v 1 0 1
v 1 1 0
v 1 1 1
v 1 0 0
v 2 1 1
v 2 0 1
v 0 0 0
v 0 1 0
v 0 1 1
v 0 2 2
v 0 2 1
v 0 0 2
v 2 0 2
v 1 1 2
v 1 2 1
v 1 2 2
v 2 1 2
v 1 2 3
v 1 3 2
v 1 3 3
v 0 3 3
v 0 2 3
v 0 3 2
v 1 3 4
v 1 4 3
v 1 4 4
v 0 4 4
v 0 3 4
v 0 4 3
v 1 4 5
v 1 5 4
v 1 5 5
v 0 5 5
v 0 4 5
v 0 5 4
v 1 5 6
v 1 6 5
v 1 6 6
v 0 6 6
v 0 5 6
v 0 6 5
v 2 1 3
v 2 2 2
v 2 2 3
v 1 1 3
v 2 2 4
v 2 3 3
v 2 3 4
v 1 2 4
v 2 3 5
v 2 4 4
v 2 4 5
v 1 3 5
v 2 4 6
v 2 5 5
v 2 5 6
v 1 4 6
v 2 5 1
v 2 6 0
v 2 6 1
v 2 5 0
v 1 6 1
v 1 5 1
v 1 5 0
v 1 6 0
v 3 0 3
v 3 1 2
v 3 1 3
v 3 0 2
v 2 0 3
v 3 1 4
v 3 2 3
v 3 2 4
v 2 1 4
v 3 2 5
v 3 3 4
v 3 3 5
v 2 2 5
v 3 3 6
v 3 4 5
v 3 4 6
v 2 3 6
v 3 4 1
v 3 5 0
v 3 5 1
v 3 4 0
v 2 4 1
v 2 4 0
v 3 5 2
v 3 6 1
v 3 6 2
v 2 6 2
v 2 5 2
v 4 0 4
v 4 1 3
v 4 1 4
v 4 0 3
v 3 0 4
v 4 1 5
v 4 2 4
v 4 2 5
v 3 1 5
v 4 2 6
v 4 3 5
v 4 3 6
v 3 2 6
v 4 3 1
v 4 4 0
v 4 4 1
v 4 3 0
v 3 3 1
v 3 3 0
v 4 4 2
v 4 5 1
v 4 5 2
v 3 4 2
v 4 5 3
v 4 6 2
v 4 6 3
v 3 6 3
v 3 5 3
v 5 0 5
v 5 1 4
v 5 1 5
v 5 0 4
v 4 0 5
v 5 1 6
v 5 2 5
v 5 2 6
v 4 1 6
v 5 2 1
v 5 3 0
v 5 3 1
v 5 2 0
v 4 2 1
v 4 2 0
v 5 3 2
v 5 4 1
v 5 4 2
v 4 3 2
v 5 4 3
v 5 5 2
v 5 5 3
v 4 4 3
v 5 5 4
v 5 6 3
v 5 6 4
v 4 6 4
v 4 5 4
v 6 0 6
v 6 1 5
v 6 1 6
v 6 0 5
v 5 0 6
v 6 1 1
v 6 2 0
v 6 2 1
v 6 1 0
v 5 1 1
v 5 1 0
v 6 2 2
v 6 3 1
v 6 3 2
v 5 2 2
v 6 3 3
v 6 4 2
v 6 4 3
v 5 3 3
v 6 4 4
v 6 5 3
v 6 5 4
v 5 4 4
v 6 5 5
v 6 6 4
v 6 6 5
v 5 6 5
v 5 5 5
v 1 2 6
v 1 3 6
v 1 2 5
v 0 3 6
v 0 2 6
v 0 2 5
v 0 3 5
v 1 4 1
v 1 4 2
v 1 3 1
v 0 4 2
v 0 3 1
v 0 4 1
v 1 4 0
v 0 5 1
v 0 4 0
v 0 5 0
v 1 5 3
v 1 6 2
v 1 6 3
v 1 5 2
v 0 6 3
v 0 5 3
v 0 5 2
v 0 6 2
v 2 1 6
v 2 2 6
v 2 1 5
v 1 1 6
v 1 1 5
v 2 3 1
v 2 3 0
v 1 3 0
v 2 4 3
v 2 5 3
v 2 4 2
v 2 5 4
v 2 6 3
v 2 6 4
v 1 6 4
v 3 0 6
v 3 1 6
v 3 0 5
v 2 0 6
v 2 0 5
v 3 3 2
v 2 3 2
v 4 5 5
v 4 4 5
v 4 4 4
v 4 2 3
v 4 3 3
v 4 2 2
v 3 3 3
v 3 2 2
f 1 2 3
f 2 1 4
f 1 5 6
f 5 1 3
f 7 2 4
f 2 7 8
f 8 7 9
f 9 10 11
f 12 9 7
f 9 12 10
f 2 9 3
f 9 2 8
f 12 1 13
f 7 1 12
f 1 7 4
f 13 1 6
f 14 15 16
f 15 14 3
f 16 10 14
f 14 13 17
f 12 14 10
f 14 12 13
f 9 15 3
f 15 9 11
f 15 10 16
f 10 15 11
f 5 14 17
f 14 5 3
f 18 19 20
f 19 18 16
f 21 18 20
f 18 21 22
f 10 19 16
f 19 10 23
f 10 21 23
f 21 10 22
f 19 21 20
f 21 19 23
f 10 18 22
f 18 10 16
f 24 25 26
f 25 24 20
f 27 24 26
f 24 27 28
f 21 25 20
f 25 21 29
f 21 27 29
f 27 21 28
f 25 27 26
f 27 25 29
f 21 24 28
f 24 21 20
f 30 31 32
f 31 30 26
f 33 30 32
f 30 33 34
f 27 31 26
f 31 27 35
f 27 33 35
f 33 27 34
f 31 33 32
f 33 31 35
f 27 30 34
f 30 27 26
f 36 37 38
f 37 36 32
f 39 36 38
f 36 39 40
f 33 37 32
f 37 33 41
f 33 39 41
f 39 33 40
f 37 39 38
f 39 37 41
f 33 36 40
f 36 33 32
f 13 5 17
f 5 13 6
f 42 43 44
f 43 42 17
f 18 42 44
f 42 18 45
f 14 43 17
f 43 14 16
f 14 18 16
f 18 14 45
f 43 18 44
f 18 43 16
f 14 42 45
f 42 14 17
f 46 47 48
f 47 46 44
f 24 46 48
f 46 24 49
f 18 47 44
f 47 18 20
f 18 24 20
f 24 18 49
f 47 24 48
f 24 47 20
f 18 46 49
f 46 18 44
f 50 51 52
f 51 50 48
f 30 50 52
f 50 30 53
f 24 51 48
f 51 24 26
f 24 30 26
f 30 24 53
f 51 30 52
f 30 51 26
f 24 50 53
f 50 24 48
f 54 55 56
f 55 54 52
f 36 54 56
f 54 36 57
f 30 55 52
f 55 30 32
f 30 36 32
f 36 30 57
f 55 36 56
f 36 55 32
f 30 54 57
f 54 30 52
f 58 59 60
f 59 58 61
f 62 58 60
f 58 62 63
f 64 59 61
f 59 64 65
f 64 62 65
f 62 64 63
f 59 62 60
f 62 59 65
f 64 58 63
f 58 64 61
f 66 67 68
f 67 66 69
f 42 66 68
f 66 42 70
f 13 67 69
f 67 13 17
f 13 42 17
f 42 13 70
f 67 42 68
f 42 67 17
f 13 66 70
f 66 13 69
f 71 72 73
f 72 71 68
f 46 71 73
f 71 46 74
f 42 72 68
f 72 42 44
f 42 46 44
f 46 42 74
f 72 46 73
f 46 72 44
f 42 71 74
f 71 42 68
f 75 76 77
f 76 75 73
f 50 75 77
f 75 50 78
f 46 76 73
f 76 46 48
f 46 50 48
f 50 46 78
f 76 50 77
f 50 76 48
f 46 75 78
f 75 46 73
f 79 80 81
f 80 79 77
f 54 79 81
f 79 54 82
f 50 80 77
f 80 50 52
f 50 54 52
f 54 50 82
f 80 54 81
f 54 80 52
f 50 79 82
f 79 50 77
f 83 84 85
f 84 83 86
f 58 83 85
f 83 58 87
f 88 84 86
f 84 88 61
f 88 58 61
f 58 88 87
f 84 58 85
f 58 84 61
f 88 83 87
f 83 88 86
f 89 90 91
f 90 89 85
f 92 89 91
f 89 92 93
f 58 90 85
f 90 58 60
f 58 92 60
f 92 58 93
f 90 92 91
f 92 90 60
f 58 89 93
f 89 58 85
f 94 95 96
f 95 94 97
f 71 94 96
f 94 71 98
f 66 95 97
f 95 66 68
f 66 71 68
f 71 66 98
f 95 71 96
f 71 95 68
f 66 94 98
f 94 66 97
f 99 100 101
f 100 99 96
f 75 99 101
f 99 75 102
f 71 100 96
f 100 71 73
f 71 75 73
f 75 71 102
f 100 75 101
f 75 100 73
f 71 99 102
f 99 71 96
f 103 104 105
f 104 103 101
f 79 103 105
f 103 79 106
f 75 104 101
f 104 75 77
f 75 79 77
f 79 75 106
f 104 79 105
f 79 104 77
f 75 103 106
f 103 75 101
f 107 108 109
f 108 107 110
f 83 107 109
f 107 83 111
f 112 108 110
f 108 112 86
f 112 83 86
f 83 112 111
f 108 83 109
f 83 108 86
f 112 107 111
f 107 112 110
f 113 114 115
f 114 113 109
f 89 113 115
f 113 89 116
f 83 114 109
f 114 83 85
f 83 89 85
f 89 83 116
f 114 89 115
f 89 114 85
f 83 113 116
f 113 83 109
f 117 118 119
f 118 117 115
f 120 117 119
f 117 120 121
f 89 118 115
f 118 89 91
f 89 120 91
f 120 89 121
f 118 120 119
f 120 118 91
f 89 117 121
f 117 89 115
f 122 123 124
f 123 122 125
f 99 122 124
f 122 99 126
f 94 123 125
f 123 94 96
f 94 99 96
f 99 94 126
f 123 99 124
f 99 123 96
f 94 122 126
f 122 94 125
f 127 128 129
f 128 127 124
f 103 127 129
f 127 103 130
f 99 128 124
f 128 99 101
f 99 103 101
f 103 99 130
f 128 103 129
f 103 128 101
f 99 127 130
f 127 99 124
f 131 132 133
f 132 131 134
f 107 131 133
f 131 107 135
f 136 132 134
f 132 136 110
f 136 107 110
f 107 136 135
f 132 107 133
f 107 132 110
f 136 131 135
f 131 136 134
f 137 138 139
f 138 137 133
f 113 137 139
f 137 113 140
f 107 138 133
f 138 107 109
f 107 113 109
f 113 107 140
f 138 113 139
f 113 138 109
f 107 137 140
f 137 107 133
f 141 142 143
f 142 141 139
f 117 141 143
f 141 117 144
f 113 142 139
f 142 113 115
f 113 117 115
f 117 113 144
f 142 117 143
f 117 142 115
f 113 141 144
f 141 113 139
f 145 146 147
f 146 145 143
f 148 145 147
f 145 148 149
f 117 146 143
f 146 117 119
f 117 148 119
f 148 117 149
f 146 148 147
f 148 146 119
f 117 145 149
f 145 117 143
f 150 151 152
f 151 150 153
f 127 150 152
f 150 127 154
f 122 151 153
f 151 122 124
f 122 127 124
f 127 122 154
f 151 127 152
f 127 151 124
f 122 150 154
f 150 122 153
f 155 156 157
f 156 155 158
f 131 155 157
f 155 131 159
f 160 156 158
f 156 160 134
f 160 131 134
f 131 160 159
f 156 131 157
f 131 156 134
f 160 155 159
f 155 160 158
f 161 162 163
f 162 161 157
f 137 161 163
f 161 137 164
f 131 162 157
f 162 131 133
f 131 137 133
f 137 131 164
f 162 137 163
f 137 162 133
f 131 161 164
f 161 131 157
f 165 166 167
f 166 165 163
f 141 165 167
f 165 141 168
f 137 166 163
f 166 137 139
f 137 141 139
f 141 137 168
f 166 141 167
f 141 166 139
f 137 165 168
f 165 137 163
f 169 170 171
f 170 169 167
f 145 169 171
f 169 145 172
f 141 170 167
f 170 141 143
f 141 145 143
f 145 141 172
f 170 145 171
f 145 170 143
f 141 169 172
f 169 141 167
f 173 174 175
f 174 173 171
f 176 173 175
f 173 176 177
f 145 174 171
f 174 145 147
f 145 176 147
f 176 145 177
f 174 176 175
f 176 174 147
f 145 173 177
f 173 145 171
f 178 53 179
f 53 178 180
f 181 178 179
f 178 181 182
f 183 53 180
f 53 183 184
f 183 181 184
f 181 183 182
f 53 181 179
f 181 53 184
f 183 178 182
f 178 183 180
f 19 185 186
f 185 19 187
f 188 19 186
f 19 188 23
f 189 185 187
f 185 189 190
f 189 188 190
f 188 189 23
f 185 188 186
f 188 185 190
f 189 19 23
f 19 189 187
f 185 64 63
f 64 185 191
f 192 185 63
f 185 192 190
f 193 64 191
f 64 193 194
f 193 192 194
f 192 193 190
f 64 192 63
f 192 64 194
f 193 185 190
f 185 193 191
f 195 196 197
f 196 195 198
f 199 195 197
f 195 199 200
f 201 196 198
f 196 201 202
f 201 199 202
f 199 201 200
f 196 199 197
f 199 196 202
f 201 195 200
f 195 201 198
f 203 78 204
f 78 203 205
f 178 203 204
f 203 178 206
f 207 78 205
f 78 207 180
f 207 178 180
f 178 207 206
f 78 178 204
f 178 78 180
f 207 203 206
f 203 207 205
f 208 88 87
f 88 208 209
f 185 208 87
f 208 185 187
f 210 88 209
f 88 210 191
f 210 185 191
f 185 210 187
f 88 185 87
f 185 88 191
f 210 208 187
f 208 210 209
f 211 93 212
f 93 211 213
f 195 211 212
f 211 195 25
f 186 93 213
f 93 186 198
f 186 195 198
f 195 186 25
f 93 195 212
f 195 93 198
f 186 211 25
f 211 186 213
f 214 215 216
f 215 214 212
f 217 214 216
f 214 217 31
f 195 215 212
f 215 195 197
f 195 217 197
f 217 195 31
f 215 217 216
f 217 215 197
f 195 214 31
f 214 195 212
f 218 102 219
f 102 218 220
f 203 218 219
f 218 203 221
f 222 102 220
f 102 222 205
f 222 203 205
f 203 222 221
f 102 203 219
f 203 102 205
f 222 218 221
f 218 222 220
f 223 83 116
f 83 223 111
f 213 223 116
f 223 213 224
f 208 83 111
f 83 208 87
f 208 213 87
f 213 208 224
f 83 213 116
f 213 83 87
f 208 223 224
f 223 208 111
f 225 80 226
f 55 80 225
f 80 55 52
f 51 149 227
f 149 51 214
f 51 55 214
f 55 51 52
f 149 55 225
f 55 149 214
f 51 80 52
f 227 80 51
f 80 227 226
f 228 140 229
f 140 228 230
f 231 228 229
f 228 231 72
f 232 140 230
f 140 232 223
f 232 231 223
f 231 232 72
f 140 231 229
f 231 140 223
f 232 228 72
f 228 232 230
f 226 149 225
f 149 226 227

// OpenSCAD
union() {
    translate([0, 0, 0]) cube([1, 1, 1]);
    translate([0, 1, 1]) cube([1, 1, 1]);
    translate([0, 2, 2]) cube([1, 1, 1]);
    translate([0, 3, 3]) cube([1, 1, 1]);
    translate([0, 4, 4]) cube([1, 1, 1]);
    translate([0, 5, 5]) cube([1, 1, 1]);
    translate([1, 0, 1]) cube([1, 1, 1]);
    translate([1, 1, 2]) cube([1, 1, 1]);
    translate([1, 2, 3]) cube([1, 1, 1]);
    translate([1, 3, 4]) cube([1, 1, 1]);
    translate([1, 4, 5]) cube([1, 1, 1]);
    translate([1, 5, 0]) cube([1, 1, 1]);
    translate([2, 0, 2]) cube([1, 1, 1]);
    translate([2, 1, 3]) cube([1, 1, 1]);
    translate([2, 2, 4]) cube([1, 1, 1]);
    translate([2, 3, 5]) cube([1, 1, 1]);
    translate([2, 4, 0]) cube([1, 1, 1]);
    translate([2, 5, 1]) cube([1, 1, 1]);
    translate([3, 0, 3]) cube([1, 1, 1]);
    translate([3, 1, 4]) cube([1, 1, 1]);
    translate([3, 2, 5]) cube([1, 1, 1]);
    translate([3, 3, 0]) cube([1, 1, 1]);
    translate([3, 4, 1]) cube([1, 1, 1]);
    translate([3, 5, 2]) cube([1, 1, 1]);
    translate([4, 0, 4]) cube([1, 1, 1]);
    translate([4, 1, 5]) cube([1, 1, 1]);
    translate([4, 2, 0]) cube([1, 1, 1]);
    translate([4, 3, 1]) cube([1, 1, 1]);
    translate([4, 4, 2]) cube([1, 1, 1]);
    translate([4, 5, 3]) cube([1, 1, 1]);
    translate([5, 0, 5]) cube([1, 1, 1]);
    translate([5, 1, 0]) cube([1, 1, 1]);
    translate([5, 2, 1]) cube([1, 1, 1]);
    translate([5, 3, 2]) cube([1, 1, 1]);
    translate([5, 4, 3]) cube([1, 1, 1]);
    translate([5, 5, 4]) cube([1, 1, 1]);
    translate([0, 0, 1]) cube([1, 1, 1]);
    translate([0, 2, 5]) cube([1, 1, 1]);
    translate([0, 3, 1]) cube([1, 1, 1]);
    translate([0, 4, 0]) cube([1, 1, 1]);
    translate([0, 5, 2]) cube([1, 1, 1]);
    translate([1, 1, 5]) cube([1, 1, 1]);
    translate([1, 3, 0]) cube([1, 1, 1]);
    translate([1, 4, 2]) cube([1, 1, 1]);
    translate([1, 5, 3]) cube([1, 1, 1]);
    translate([2, 0, 5]) cube([1, 1, 1]);
    translate([2, 3, 1]) cube([1, 1, 1]);
    translate([2, 4, 4]) cube([1, 1, 1]);
    translate([3, 2, 2]) cube([1, 1, 1]);
    translate([3, 4, 4]) cube([1, 1, 1]);
}
